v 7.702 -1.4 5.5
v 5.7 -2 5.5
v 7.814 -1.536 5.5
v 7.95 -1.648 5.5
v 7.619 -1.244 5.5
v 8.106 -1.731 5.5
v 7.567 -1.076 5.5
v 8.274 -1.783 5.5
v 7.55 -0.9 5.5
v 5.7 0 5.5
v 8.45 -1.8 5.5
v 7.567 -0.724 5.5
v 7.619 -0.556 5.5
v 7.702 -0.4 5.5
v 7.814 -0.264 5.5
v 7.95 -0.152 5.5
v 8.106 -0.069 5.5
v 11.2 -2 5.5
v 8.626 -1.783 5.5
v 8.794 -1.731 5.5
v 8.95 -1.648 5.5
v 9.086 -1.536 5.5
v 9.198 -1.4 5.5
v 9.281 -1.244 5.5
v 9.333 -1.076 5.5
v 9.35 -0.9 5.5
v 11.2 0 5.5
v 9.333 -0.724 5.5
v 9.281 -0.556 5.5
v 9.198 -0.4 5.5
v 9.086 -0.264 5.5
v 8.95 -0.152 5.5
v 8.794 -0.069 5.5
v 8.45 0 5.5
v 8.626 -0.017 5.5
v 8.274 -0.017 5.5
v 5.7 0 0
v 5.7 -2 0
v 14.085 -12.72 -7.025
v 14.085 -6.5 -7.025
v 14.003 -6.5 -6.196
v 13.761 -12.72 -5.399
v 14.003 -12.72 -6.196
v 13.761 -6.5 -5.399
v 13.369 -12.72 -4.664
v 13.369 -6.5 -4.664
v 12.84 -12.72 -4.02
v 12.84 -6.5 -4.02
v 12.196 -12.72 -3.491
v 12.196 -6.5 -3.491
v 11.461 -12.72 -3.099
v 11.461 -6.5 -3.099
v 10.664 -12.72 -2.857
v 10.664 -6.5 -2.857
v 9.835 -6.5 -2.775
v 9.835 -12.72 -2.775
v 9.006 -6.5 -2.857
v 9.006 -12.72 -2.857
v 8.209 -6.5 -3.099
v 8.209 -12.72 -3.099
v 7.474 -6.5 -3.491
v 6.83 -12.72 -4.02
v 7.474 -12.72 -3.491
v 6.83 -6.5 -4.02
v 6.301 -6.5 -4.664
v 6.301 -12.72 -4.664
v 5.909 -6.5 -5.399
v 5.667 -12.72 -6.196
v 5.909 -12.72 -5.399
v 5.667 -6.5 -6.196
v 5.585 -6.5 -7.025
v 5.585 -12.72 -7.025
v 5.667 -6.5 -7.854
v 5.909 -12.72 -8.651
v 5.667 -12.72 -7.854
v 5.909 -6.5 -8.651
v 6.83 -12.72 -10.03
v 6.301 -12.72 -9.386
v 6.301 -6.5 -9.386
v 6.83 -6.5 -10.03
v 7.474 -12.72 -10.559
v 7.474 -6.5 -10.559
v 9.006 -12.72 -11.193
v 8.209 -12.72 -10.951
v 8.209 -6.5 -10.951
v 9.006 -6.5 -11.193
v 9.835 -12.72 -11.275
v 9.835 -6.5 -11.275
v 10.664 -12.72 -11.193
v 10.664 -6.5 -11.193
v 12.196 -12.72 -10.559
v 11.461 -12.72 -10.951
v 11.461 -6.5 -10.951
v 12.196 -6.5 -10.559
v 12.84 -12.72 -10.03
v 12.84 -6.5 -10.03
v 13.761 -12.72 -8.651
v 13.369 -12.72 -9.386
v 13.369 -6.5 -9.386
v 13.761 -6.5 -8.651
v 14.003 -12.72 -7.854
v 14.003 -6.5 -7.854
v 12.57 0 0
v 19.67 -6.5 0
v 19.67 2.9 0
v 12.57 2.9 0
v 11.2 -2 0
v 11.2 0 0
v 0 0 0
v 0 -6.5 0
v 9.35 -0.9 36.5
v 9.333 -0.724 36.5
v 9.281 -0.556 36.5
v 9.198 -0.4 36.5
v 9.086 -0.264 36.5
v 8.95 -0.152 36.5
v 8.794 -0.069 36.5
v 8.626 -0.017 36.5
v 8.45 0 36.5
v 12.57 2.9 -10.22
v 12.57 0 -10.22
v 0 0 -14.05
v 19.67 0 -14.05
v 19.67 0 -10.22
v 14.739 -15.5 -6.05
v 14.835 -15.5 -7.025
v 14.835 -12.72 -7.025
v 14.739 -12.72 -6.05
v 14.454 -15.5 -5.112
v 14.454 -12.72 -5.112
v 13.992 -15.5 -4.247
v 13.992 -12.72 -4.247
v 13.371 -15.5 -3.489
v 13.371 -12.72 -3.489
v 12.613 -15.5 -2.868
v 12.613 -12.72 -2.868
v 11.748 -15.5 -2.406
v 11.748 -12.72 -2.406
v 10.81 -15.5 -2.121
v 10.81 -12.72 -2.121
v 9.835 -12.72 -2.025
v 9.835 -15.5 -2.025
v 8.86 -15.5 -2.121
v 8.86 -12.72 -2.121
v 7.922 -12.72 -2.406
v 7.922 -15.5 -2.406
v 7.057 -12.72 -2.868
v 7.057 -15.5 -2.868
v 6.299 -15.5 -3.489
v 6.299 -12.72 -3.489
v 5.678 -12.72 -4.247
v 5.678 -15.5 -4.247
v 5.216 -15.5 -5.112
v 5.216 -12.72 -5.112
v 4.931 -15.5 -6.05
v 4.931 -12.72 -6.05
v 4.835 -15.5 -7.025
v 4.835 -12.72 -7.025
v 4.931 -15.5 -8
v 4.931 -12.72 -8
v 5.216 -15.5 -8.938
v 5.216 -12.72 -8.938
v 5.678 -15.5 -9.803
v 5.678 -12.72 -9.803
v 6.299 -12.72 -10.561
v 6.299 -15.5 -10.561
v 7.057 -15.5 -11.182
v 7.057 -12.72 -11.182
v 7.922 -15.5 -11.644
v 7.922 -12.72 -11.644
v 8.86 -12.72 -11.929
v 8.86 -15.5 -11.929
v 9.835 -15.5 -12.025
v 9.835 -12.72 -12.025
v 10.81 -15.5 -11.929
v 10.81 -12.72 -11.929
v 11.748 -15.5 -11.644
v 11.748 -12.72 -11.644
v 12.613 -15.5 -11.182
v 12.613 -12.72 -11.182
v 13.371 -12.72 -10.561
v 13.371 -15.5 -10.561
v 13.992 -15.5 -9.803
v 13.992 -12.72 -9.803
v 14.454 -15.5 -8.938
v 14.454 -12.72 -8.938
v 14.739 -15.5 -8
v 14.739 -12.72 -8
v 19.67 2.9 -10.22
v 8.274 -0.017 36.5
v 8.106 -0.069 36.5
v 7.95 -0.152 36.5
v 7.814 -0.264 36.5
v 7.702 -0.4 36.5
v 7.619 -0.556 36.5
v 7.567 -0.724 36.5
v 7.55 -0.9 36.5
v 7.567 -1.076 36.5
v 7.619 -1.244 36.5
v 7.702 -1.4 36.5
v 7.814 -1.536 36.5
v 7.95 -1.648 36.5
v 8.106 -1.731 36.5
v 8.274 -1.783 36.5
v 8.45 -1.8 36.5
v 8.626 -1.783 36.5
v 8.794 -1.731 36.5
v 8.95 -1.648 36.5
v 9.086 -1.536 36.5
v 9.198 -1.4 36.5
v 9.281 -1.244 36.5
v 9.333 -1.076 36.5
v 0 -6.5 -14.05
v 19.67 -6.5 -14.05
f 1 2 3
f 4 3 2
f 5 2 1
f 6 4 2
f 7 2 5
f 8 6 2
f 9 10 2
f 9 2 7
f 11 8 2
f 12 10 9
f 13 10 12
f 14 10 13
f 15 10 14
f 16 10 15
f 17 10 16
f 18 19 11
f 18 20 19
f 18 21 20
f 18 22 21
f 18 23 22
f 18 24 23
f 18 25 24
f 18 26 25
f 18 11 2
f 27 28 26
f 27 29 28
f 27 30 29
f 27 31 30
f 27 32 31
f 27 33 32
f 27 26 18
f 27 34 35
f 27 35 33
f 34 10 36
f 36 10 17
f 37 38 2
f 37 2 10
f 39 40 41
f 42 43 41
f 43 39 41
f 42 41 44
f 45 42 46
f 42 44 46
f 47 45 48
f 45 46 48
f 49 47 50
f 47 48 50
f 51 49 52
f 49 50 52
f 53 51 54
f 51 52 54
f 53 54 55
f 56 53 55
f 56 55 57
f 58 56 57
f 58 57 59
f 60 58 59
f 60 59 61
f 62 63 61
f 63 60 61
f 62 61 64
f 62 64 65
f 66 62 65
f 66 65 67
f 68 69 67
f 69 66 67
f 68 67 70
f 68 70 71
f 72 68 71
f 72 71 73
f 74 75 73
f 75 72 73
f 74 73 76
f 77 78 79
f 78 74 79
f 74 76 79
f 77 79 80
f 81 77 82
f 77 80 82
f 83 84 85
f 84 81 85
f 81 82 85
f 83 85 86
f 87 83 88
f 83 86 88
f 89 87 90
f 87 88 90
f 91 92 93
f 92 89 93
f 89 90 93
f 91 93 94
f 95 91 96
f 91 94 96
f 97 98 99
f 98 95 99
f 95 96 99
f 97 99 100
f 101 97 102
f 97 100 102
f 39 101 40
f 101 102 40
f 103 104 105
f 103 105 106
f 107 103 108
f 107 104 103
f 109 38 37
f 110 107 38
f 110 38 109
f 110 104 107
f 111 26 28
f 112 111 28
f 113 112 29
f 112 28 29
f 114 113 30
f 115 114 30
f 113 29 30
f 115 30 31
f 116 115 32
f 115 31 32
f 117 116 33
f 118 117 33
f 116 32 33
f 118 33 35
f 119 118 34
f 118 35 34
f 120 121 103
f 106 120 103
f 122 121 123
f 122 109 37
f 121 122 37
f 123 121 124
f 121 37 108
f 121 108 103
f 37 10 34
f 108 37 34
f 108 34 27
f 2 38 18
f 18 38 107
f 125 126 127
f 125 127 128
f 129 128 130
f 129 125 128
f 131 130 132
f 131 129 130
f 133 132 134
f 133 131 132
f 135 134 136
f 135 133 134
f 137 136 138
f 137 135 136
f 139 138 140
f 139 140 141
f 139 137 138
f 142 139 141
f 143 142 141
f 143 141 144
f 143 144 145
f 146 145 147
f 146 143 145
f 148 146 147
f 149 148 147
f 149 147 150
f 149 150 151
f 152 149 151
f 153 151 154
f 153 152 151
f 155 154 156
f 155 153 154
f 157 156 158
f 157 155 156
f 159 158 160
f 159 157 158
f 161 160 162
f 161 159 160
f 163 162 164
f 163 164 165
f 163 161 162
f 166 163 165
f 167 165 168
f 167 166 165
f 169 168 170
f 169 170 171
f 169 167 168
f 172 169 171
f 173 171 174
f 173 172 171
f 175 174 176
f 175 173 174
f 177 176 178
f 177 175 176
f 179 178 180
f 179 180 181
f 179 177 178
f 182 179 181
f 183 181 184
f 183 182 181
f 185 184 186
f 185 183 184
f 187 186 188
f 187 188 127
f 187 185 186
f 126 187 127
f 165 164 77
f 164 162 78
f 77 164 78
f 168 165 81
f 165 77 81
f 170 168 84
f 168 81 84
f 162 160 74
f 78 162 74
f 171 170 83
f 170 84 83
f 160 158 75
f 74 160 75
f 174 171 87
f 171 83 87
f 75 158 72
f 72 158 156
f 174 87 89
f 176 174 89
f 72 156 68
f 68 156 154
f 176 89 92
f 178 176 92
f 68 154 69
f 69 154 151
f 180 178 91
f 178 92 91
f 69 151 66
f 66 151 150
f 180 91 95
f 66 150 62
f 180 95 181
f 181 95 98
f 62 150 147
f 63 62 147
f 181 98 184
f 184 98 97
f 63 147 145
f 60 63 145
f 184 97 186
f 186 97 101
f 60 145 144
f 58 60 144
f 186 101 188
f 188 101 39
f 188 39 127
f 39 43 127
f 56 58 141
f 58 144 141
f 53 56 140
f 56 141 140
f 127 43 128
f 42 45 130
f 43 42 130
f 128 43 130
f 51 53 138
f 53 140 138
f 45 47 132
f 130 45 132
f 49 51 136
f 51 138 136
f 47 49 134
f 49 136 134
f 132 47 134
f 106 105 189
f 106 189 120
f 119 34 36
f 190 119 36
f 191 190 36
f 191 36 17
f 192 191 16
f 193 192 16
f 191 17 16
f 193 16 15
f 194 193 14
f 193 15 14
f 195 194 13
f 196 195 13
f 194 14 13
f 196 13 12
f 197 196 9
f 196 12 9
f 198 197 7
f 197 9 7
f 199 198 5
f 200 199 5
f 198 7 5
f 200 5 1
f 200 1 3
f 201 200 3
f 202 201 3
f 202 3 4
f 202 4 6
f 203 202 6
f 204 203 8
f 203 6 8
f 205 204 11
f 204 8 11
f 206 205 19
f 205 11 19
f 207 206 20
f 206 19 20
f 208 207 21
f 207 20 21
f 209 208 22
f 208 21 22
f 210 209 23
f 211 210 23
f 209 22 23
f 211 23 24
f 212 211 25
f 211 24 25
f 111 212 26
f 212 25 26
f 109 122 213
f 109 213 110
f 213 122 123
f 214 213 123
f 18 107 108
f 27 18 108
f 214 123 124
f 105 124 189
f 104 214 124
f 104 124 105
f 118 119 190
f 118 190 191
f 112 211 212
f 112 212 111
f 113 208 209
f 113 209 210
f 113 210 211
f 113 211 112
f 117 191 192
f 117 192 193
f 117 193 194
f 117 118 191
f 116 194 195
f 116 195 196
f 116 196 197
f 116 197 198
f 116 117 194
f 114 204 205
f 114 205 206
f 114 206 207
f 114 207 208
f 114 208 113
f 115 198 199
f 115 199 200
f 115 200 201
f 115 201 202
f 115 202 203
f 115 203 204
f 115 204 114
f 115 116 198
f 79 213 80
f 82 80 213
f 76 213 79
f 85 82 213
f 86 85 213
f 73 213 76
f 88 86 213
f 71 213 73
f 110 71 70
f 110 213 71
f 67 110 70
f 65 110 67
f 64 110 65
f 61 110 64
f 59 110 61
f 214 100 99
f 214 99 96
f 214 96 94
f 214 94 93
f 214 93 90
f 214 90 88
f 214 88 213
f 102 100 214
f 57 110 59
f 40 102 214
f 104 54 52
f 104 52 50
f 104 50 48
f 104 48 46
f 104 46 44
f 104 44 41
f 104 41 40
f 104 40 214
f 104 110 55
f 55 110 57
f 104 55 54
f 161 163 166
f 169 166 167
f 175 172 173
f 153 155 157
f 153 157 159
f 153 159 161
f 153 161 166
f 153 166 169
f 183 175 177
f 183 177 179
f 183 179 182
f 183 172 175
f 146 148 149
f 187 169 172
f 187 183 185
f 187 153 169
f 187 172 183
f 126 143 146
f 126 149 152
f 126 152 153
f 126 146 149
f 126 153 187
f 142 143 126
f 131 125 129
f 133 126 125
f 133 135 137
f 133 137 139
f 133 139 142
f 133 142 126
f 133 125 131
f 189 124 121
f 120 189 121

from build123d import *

# Parameters (mm, degrees)
F0_W      = 19.67
F0_H      = 14.05
F0_R      = 4.25
F1_DEPTH  = 6.5
F2_DEPTH  = 15.5
F3_R      = 5
F4_DEPTH  = 2.78
F5_W      = 7.1
F5_H      = 10.22
F6_DEPTH  = 2.9
F7_W      = 5.5
F7_H      = 2
F8_DEPTH  = 5.5
F10_DEPTH = 31


with BuildPart() as f1:
    # F0 (on Front) → F1 (new body)
    with BuildSketch(Plane.XZ):
        with Locations((9.835, -7.025)):
            Rectangle(F0_W, F0_H)
        with Locations((9.835, -7.025)):
            Circle(F0_R, mode=Mode.SUBTRACT)
        with Locations((9.835, -7.025)):
            Circle(F0_R)
    extrude(amount=F1_DEPTH)

    # F0 (on Front) → F2 (join)
    with BuildSketch(Plane.XZ):
        with Locations((9.835, -7.025)):
            Circle(F0_R)
    extrude(amount=F2_DEPTH)

    # F3 (on face) → F4 (join)
    with BuildSketch(Plane.XZ.offset(15.5)):
        with Locations((9.835, -7.025)):
            Circle(F3_R)
    extrude(amount=-F4_DEPTH)

    # F5 (on face) → F6 (join)
    with BuildSketch(Plane(origin=(0, 0, 0), x_dir=(-1, 0, 0), z_dir=(0, 1, 0))):
        with Locations((-16.12, -5.11)):
            Rectangle(F5_W, F5_H)
    extrude(amount=F6_DEPTH)

    # F7 (on face) → F8 (join)
    with BuildSketch(Plane.XY):
        with Locations((8.45, -1)):
            Rectangle(F7_W, F7_H)
    extrude(amount=F8_DEPTH)

    # F9 (on face) → F10 (join)
    with BuildSketch(Plane.XY.offset(5.5)):
        with BuildLine():
            ThreePointArc((8.45, 0), (7.813604, -1.536396), (9.35, -0.9))
            ThreePointArc((9.35, -0.9), (9.086396, -0.263604), (8.45, 0))
        make_face()
    extrude(amount=F10_DEPTH)


solid = f1.part
